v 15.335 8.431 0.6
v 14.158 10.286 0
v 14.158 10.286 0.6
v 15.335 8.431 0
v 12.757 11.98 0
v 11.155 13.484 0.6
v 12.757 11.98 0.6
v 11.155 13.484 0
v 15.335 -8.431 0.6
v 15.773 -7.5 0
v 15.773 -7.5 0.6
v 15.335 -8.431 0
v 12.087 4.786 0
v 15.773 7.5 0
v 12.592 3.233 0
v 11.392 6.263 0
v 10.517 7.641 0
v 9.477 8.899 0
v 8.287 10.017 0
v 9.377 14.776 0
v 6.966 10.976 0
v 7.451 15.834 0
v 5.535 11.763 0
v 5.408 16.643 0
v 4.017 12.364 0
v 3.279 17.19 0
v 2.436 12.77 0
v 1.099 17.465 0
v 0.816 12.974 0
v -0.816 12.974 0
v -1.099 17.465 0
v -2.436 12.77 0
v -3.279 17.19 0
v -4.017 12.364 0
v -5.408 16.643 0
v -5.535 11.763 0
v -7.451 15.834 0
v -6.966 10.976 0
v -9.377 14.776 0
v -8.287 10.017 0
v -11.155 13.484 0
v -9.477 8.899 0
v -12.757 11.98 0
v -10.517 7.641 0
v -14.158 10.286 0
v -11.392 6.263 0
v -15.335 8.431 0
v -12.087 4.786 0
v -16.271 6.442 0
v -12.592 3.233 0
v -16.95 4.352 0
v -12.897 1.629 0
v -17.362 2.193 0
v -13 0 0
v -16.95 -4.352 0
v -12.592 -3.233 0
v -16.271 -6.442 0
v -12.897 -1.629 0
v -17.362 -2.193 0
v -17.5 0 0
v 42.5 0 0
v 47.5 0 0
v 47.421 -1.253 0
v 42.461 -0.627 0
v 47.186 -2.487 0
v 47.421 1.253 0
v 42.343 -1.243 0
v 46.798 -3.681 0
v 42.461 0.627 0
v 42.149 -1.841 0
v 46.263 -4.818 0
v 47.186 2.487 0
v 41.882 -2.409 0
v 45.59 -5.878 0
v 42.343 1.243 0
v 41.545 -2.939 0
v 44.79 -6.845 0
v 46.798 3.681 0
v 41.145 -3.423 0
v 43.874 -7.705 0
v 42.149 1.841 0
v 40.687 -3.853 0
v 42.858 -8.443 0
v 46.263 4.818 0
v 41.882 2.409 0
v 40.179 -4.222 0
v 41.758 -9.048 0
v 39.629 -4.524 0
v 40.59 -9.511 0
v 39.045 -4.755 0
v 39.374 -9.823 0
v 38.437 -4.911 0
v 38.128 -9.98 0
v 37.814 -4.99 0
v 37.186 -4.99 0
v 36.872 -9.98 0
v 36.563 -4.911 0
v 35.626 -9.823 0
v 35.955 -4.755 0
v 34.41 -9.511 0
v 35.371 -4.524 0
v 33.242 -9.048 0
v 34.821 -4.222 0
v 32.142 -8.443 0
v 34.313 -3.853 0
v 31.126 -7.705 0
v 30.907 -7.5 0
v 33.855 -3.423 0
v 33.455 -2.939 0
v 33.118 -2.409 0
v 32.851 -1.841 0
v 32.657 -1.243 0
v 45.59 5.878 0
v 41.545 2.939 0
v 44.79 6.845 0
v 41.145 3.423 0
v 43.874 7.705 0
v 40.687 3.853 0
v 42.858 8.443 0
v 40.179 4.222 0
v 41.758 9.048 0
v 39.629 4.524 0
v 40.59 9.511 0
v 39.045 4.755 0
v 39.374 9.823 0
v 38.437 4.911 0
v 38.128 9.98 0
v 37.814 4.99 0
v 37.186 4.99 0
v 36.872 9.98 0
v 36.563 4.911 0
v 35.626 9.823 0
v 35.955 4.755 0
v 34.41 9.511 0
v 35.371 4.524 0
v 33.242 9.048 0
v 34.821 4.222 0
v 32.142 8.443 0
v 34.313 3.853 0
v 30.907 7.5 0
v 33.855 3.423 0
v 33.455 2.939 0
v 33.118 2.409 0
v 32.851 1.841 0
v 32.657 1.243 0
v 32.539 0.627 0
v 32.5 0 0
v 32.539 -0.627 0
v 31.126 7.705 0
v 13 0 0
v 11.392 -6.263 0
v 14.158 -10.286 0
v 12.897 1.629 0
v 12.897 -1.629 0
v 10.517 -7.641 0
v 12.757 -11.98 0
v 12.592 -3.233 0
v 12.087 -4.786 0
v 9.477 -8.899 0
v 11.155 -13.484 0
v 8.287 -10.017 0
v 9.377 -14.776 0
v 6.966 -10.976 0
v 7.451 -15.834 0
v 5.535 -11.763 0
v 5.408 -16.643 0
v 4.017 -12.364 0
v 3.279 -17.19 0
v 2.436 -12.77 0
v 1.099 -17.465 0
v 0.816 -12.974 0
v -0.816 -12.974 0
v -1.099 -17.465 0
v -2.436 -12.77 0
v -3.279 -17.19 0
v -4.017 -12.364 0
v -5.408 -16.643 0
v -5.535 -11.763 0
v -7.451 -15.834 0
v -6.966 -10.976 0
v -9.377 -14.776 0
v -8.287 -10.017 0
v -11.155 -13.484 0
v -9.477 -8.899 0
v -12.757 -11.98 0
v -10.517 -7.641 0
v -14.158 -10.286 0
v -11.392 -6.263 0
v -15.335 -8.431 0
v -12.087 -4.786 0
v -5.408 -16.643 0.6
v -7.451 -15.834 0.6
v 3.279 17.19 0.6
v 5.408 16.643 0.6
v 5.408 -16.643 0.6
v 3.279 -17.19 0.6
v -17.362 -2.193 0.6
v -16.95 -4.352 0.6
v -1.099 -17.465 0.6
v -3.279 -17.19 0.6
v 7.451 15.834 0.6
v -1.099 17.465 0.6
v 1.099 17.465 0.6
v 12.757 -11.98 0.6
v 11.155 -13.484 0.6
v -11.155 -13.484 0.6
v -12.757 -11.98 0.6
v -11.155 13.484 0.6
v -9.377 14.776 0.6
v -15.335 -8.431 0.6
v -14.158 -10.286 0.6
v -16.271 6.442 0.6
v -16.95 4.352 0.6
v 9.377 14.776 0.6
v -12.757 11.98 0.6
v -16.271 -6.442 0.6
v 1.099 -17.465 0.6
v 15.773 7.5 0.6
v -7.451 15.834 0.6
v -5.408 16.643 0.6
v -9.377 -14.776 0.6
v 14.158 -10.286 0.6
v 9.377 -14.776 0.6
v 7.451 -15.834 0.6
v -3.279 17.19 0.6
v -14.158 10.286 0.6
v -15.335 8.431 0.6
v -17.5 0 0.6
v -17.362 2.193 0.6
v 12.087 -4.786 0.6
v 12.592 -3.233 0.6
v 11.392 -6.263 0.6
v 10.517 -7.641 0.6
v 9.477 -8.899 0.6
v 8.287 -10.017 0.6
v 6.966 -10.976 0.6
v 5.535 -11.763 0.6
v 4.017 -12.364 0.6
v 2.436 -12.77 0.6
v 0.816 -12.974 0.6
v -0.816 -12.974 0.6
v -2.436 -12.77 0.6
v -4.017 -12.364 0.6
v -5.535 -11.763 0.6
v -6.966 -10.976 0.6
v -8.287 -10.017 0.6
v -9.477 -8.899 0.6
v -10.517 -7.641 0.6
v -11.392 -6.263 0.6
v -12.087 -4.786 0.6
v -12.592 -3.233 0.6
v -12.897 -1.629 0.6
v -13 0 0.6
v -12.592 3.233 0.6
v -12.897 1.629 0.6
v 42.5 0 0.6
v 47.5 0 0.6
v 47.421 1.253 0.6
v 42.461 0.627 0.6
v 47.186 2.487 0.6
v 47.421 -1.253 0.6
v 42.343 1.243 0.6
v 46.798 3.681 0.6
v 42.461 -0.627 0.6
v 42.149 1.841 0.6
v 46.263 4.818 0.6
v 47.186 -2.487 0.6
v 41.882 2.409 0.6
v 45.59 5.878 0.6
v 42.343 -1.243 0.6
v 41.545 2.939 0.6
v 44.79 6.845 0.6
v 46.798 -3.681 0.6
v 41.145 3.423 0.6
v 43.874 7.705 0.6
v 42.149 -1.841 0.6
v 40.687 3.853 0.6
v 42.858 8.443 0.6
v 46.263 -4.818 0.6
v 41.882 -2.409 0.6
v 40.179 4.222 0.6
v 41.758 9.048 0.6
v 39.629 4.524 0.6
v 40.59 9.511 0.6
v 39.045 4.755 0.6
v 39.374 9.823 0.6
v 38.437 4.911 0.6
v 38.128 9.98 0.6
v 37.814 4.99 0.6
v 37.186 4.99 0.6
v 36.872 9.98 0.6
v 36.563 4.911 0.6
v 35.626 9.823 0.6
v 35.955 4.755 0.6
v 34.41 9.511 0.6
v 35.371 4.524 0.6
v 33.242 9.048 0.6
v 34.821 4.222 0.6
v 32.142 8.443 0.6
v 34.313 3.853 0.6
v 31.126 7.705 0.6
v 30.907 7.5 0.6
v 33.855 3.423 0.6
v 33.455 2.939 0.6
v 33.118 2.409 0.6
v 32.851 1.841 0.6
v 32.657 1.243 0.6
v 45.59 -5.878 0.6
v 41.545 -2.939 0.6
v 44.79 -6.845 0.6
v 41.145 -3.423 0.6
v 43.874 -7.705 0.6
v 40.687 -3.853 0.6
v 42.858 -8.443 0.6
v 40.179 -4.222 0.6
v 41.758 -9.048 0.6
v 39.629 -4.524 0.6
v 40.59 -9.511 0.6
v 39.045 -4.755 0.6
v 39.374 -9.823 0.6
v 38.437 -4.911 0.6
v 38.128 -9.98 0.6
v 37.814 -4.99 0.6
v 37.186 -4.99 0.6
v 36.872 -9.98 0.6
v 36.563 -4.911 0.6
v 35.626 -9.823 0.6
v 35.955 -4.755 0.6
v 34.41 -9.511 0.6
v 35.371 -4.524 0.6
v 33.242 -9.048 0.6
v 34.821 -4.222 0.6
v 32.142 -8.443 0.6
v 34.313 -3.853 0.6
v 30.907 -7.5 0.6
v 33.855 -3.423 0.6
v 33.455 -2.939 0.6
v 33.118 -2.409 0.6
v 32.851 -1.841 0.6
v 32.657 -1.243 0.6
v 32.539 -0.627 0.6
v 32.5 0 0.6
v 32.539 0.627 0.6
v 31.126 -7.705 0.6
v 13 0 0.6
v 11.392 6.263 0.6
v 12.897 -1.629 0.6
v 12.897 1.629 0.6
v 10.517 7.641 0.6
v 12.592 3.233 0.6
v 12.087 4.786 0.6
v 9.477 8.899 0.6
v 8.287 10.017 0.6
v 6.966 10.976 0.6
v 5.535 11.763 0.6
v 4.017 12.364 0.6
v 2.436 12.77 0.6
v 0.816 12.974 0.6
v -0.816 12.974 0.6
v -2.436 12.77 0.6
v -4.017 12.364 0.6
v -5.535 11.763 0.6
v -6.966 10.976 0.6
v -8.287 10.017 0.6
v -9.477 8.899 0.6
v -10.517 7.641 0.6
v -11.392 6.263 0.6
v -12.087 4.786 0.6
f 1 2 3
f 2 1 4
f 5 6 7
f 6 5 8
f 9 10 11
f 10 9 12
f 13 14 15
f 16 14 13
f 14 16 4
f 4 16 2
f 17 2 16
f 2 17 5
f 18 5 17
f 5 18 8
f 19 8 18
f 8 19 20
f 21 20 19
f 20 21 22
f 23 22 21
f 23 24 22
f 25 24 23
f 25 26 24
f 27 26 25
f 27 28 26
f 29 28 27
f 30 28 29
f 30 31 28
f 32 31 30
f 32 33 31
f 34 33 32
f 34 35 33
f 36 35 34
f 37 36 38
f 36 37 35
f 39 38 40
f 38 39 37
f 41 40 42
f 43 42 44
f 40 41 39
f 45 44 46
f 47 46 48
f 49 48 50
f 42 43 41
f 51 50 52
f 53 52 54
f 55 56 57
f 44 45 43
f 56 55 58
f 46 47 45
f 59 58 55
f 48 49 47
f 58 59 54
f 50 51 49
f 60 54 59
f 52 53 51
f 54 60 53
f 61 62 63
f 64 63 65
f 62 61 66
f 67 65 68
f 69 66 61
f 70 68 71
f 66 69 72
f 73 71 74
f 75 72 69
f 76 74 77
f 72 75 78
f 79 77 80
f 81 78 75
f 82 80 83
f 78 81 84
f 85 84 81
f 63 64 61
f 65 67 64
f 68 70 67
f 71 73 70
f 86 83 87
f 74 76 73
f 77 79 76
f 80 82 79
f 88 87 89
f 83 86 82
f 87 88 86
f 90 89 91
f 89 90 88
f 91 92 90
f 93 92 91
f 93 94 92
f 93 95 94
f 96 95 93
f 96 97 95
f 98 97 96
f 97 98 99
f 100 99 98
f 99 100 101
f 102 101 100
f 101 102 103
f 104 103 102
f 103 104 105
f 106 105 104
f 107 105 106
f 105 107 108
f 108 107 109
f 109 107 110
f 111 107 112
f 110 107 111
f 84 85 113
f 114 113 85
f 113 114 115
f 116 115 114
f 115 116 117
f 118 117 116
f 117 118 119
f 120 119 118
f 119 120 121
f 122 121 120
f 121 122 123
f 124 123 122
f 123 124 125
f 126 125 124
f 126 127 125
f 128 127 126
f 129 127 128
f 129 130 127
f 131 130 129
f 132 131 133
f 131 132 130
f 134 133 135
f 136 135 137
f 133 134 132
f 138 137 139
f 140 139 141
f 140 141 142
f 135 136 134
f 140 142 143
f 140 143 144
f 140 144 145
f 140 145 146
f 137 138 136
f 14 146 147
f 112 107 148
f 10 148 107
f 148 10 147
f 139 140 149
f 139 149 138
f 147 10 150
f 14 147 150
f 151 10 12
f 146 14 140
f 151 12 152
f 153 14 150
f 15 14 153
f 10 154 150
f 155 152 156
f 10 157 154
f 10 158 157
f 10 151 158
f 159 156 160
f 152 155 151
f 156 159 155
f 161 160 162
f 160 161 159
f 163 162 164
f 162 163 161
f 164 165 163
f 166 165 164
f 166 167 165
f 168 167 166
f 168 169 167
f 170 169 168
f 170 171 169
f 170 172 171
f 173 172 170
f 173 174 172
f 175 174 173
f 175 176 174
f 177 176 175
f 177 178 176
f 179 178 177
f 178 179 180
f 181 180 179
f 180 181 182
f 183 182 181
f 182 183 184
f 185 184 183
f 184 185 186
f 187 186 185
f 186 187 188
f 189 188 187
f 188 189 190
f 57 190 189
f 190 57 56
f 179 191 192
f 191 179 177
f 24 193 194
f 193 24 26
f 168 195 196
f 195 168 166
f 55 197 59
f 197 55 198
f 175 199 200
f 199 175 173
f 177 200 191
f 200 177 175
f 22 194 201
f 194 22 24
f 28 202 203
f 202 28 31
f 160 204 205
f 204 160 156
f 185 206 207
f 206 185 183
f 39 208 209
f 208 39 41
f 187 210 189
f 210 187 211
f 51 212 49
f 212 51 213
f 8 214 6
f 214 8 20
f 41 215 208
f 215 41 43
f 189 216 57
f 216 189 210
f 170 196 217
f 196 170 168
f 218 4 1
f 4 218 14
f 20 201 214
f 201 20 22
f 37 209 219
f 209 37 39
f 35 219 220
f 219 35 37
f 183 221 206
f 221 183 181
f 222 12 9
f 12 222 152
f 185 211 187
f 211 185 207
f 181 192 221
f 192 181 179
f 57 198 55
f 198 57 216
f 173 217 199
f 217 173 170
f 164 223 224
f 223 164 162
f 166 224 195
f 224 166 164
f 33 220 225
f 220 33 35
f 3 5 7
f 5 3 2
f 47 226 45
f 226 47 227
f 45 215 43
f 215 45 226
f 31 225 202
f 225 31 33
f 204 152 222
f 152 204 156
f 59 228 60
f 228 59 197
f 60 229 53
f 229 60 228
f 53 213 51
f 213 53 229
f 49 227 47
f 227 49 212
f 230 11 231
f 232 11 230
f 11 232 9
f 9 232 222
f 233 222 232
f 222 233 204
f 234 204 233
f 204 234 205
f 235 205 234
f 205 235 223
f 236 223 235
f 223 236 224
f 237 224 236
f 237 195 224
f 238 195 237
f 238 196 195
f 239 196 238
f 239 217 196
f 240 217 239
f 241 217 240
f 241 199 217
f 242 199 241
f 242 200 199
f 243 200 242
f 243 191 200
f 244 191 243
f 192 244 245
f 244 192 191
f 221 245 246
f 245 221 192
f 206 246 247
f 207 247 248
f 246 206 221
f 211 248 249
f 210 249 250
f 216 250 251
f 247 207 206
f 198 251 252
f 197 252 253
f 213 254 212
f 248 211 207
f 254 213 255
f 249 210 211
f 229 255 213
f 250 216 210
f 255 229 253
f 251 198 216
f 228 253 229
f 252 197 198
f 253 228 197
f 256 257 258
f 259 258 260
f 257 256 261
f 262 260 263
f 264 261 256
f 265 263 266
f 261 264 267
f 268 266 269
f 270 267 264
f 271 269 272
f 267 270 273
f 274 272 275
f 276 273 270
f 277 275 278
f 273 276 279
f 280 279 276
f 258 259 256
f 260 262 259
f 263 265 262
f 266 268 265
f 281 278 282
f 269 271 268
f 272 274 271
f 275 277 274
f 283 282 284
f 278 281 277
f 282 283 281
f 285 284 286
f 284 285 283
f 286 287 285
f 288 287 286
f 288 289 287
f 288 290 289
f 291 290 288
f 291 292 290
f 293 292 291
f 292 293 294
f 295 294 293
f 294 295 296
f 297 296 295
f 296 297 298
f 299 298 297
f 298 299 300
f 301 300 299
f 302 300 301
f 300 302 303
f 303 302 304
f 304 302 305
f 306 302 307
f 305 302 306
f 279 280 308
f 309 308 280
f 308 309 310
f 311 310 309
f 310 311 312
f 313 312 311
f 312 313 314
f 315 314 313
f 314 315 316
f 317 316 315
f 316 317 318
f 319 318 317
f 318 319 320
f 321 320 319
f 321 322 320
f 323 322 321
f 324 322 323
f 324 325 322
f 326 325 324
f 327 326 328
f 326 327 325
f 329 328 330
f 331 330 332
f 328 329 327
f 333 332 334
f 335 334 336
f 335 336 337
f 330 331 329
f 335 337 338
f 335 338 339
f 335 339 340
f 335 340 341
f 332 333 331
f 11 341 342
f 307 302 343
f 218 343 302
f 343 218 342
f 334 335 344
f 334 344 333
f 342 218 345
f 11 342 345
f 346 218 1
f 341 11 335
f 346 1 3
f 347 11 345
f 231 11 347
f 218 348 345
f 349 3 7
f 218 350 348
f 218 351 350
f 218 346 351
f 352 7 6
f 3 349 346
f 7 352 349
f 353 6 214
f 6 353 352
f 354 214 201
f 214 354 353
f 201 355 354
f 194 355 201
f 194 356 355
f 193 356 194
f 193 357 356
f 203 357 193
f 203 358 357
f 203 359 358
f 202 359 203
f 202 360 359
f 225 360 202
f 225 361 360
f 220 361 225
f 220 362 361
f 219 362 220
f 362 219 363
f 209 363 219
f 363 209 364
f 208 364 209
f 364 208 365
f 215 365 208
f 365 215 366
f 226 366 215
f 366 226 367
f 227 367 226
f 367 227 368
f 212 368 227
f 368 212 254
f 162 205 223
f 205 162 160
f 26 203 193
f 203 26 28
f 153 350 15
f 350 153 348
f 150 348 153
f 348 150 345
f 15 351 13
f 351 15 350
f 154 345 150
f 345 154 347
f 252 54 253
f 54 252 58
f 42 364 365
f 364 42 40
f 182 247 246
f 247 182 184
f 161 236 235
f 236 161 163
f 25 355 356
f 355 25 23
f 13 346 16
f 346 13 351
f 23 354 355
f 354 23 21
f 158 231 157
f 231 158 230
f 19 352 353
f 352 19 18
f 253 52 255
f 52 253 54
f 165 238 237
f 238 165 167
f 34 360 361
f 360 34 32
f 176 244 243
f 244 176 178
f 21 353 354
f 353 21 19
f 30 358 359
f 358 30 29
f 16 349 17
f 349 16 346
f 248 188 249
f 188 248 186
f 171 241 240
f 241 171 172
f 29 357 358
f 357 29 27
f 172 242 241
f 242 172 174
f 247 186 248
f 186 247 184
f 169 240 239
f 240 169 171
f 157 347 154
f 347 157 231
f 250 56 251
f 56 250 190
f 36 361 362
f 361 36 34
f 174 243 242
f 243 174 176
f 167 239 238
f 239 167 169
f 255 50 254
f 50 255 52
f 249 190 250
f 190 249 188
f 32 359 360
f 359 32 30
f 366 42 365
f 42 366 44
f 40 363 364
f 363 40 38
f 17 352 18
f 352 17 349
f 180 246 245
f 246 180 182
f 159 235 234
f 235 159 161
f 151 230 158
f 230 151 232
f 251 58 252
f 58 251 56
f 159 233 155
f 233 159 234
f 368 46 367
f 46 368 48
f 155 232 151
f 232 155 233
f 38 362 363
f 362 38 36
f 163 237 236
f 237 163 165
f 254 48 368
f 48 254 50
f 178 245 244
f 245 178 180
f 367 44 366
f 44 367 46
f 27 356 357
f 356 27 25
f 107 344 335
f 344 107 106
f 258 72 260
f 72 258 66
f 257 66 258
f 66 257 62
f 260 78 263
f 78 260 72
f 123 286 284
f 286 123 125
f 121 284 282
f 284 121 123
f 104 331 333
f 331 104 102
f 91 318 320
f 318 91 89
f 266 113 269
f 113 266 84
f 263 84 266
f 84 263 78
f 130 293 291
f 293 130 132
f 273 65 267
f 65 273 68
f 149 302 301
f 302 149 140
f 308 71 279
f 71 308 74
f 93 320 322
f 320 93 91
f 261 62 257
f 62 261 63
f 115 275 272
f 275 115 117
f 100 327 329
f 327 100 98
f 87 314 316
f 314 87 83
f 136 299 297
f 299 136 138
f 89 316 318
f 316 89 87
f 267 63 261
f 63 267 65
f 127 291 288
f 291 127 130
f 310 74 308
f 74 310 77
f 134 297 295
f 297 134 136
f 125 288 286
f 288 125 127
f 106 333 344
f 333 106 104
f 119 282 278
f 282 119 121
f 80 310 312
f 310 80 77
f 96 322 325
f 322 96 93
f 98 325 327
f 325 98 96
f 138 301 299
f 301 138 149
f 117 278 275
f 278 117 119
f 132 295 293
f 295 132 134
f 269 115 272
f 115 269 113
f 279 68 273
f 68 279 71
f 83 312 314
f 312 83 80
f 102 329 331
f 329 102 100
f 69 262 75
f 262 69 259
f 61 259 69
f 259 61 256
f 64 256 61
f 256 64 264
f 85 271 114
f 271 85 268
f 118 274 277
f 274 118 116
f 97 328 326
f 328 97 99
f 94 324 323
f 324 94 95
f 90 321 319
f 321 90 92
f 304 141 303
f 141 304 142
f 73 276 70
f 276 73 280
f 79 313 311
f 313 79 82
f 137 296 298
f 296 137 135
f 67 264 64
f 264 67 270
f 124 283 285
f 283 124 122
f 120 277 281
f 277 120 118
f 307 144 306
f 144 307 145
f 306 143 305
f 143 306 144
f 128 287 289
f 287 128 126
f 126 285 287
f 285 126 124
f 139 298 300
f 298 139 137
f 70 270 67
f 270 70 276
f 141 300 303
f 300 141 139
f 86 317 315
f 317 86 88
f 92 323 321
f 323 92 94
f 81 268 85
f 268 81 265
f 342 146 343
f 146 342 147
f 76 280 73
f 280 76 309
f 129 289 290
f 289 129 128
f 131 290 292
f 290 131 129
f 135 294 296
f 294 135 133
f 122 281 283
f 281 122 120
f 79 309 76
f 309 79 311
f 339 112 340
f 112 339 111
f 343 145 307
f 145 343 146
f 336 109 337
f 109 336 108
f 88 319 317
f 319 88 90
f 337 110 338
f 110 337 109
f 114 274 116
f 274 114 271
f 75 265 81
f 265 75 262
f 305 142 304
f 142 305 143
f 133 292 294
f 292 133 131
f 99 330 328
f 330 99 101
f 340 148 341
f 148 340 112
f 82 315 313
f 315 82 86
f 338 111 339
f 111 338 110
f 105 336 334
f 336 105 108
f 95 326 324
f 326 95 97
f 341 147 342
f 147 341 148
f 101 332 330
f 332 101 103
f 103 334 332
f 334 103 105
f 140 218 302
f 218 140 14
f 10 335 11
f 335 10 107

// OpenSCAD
/*
Simple Two-Ring Carry Loop
Units: millimeters

bar_length = clear distance between the OUTER edges of the two rings.
The bar overlaps each ring slightly so the exported STL is one solid.
*/

// ---------- Configurable dimensions ----------

// Ring 1
ring1_id = 26;       // inside diameter
ring1_od = 35;       // outside diameter

// Ring 2
ring2_id = 10;       // inside diameter
ring2_od = 20;       // outside diameter

// Connecting bar
bar_length = 10;     // clear span between ring outer edges
bar_width  = 15;     // width of bar in the XY plane

// Whole part
thickness = 0.6;       // Z thickness

// Circle smoothness
$fn = 50;


// ---------- Internal settings ----------

// Small overlap ensures the bar and rings form one manifold solid.
join_overlap = 4.0;


// ---------- Validation ----------

assert(ring1_id > 0, "ring1_id must be > 0");
assert(ring2_id > 0, "ring2_id must be > 0");
assert(ring1_od > ring1_id, "ring1_od must be greater than ring1_id");
assert(ring2_od > ring2_id, "ring2_od must be greater than ring2_id");
assert(bar_length >= 0, "bar_length must be >= 0");
assert(bar_width > 0, "bar_width must be > 0");
assert(thickness > 0, "thickness must be > 0");

r1 = ring1_od / 2;
r2 = ring2_od / 2;

// Place ring 1 at x=0.
// Ring 2 is positioned so the clear OD-to-OD gap equals bar_length.
ring2_x = r1 + bar_length + r2;


// ---------- Geometry ----------

module ring(od, id, h) {
    difference() {
        cylinder(d = od, h = h);
        translate([0, 0, -0.01])
            cylinder(d = id, h = h + 0.02);
    }
}

module carry_loop() {
    union() {
        // Ring 1
        ring(ring1_od, ring1_id, thickness);

        // Ring 2
        translate([ring2_x, 0, 0])
            ring(ring2_od, ring2_id, thickness);

        // Connecting bar.
        // It extends join_overlap into each ring for a reliable union.
        translate([
            r1 - join_overlap,
            -bar_width / 2,
            0
        ])
            cube([
                bar_length + 2 * join_overlap,
                bar_width,
                thickness
            ]);
    }
}

carry_loop();
